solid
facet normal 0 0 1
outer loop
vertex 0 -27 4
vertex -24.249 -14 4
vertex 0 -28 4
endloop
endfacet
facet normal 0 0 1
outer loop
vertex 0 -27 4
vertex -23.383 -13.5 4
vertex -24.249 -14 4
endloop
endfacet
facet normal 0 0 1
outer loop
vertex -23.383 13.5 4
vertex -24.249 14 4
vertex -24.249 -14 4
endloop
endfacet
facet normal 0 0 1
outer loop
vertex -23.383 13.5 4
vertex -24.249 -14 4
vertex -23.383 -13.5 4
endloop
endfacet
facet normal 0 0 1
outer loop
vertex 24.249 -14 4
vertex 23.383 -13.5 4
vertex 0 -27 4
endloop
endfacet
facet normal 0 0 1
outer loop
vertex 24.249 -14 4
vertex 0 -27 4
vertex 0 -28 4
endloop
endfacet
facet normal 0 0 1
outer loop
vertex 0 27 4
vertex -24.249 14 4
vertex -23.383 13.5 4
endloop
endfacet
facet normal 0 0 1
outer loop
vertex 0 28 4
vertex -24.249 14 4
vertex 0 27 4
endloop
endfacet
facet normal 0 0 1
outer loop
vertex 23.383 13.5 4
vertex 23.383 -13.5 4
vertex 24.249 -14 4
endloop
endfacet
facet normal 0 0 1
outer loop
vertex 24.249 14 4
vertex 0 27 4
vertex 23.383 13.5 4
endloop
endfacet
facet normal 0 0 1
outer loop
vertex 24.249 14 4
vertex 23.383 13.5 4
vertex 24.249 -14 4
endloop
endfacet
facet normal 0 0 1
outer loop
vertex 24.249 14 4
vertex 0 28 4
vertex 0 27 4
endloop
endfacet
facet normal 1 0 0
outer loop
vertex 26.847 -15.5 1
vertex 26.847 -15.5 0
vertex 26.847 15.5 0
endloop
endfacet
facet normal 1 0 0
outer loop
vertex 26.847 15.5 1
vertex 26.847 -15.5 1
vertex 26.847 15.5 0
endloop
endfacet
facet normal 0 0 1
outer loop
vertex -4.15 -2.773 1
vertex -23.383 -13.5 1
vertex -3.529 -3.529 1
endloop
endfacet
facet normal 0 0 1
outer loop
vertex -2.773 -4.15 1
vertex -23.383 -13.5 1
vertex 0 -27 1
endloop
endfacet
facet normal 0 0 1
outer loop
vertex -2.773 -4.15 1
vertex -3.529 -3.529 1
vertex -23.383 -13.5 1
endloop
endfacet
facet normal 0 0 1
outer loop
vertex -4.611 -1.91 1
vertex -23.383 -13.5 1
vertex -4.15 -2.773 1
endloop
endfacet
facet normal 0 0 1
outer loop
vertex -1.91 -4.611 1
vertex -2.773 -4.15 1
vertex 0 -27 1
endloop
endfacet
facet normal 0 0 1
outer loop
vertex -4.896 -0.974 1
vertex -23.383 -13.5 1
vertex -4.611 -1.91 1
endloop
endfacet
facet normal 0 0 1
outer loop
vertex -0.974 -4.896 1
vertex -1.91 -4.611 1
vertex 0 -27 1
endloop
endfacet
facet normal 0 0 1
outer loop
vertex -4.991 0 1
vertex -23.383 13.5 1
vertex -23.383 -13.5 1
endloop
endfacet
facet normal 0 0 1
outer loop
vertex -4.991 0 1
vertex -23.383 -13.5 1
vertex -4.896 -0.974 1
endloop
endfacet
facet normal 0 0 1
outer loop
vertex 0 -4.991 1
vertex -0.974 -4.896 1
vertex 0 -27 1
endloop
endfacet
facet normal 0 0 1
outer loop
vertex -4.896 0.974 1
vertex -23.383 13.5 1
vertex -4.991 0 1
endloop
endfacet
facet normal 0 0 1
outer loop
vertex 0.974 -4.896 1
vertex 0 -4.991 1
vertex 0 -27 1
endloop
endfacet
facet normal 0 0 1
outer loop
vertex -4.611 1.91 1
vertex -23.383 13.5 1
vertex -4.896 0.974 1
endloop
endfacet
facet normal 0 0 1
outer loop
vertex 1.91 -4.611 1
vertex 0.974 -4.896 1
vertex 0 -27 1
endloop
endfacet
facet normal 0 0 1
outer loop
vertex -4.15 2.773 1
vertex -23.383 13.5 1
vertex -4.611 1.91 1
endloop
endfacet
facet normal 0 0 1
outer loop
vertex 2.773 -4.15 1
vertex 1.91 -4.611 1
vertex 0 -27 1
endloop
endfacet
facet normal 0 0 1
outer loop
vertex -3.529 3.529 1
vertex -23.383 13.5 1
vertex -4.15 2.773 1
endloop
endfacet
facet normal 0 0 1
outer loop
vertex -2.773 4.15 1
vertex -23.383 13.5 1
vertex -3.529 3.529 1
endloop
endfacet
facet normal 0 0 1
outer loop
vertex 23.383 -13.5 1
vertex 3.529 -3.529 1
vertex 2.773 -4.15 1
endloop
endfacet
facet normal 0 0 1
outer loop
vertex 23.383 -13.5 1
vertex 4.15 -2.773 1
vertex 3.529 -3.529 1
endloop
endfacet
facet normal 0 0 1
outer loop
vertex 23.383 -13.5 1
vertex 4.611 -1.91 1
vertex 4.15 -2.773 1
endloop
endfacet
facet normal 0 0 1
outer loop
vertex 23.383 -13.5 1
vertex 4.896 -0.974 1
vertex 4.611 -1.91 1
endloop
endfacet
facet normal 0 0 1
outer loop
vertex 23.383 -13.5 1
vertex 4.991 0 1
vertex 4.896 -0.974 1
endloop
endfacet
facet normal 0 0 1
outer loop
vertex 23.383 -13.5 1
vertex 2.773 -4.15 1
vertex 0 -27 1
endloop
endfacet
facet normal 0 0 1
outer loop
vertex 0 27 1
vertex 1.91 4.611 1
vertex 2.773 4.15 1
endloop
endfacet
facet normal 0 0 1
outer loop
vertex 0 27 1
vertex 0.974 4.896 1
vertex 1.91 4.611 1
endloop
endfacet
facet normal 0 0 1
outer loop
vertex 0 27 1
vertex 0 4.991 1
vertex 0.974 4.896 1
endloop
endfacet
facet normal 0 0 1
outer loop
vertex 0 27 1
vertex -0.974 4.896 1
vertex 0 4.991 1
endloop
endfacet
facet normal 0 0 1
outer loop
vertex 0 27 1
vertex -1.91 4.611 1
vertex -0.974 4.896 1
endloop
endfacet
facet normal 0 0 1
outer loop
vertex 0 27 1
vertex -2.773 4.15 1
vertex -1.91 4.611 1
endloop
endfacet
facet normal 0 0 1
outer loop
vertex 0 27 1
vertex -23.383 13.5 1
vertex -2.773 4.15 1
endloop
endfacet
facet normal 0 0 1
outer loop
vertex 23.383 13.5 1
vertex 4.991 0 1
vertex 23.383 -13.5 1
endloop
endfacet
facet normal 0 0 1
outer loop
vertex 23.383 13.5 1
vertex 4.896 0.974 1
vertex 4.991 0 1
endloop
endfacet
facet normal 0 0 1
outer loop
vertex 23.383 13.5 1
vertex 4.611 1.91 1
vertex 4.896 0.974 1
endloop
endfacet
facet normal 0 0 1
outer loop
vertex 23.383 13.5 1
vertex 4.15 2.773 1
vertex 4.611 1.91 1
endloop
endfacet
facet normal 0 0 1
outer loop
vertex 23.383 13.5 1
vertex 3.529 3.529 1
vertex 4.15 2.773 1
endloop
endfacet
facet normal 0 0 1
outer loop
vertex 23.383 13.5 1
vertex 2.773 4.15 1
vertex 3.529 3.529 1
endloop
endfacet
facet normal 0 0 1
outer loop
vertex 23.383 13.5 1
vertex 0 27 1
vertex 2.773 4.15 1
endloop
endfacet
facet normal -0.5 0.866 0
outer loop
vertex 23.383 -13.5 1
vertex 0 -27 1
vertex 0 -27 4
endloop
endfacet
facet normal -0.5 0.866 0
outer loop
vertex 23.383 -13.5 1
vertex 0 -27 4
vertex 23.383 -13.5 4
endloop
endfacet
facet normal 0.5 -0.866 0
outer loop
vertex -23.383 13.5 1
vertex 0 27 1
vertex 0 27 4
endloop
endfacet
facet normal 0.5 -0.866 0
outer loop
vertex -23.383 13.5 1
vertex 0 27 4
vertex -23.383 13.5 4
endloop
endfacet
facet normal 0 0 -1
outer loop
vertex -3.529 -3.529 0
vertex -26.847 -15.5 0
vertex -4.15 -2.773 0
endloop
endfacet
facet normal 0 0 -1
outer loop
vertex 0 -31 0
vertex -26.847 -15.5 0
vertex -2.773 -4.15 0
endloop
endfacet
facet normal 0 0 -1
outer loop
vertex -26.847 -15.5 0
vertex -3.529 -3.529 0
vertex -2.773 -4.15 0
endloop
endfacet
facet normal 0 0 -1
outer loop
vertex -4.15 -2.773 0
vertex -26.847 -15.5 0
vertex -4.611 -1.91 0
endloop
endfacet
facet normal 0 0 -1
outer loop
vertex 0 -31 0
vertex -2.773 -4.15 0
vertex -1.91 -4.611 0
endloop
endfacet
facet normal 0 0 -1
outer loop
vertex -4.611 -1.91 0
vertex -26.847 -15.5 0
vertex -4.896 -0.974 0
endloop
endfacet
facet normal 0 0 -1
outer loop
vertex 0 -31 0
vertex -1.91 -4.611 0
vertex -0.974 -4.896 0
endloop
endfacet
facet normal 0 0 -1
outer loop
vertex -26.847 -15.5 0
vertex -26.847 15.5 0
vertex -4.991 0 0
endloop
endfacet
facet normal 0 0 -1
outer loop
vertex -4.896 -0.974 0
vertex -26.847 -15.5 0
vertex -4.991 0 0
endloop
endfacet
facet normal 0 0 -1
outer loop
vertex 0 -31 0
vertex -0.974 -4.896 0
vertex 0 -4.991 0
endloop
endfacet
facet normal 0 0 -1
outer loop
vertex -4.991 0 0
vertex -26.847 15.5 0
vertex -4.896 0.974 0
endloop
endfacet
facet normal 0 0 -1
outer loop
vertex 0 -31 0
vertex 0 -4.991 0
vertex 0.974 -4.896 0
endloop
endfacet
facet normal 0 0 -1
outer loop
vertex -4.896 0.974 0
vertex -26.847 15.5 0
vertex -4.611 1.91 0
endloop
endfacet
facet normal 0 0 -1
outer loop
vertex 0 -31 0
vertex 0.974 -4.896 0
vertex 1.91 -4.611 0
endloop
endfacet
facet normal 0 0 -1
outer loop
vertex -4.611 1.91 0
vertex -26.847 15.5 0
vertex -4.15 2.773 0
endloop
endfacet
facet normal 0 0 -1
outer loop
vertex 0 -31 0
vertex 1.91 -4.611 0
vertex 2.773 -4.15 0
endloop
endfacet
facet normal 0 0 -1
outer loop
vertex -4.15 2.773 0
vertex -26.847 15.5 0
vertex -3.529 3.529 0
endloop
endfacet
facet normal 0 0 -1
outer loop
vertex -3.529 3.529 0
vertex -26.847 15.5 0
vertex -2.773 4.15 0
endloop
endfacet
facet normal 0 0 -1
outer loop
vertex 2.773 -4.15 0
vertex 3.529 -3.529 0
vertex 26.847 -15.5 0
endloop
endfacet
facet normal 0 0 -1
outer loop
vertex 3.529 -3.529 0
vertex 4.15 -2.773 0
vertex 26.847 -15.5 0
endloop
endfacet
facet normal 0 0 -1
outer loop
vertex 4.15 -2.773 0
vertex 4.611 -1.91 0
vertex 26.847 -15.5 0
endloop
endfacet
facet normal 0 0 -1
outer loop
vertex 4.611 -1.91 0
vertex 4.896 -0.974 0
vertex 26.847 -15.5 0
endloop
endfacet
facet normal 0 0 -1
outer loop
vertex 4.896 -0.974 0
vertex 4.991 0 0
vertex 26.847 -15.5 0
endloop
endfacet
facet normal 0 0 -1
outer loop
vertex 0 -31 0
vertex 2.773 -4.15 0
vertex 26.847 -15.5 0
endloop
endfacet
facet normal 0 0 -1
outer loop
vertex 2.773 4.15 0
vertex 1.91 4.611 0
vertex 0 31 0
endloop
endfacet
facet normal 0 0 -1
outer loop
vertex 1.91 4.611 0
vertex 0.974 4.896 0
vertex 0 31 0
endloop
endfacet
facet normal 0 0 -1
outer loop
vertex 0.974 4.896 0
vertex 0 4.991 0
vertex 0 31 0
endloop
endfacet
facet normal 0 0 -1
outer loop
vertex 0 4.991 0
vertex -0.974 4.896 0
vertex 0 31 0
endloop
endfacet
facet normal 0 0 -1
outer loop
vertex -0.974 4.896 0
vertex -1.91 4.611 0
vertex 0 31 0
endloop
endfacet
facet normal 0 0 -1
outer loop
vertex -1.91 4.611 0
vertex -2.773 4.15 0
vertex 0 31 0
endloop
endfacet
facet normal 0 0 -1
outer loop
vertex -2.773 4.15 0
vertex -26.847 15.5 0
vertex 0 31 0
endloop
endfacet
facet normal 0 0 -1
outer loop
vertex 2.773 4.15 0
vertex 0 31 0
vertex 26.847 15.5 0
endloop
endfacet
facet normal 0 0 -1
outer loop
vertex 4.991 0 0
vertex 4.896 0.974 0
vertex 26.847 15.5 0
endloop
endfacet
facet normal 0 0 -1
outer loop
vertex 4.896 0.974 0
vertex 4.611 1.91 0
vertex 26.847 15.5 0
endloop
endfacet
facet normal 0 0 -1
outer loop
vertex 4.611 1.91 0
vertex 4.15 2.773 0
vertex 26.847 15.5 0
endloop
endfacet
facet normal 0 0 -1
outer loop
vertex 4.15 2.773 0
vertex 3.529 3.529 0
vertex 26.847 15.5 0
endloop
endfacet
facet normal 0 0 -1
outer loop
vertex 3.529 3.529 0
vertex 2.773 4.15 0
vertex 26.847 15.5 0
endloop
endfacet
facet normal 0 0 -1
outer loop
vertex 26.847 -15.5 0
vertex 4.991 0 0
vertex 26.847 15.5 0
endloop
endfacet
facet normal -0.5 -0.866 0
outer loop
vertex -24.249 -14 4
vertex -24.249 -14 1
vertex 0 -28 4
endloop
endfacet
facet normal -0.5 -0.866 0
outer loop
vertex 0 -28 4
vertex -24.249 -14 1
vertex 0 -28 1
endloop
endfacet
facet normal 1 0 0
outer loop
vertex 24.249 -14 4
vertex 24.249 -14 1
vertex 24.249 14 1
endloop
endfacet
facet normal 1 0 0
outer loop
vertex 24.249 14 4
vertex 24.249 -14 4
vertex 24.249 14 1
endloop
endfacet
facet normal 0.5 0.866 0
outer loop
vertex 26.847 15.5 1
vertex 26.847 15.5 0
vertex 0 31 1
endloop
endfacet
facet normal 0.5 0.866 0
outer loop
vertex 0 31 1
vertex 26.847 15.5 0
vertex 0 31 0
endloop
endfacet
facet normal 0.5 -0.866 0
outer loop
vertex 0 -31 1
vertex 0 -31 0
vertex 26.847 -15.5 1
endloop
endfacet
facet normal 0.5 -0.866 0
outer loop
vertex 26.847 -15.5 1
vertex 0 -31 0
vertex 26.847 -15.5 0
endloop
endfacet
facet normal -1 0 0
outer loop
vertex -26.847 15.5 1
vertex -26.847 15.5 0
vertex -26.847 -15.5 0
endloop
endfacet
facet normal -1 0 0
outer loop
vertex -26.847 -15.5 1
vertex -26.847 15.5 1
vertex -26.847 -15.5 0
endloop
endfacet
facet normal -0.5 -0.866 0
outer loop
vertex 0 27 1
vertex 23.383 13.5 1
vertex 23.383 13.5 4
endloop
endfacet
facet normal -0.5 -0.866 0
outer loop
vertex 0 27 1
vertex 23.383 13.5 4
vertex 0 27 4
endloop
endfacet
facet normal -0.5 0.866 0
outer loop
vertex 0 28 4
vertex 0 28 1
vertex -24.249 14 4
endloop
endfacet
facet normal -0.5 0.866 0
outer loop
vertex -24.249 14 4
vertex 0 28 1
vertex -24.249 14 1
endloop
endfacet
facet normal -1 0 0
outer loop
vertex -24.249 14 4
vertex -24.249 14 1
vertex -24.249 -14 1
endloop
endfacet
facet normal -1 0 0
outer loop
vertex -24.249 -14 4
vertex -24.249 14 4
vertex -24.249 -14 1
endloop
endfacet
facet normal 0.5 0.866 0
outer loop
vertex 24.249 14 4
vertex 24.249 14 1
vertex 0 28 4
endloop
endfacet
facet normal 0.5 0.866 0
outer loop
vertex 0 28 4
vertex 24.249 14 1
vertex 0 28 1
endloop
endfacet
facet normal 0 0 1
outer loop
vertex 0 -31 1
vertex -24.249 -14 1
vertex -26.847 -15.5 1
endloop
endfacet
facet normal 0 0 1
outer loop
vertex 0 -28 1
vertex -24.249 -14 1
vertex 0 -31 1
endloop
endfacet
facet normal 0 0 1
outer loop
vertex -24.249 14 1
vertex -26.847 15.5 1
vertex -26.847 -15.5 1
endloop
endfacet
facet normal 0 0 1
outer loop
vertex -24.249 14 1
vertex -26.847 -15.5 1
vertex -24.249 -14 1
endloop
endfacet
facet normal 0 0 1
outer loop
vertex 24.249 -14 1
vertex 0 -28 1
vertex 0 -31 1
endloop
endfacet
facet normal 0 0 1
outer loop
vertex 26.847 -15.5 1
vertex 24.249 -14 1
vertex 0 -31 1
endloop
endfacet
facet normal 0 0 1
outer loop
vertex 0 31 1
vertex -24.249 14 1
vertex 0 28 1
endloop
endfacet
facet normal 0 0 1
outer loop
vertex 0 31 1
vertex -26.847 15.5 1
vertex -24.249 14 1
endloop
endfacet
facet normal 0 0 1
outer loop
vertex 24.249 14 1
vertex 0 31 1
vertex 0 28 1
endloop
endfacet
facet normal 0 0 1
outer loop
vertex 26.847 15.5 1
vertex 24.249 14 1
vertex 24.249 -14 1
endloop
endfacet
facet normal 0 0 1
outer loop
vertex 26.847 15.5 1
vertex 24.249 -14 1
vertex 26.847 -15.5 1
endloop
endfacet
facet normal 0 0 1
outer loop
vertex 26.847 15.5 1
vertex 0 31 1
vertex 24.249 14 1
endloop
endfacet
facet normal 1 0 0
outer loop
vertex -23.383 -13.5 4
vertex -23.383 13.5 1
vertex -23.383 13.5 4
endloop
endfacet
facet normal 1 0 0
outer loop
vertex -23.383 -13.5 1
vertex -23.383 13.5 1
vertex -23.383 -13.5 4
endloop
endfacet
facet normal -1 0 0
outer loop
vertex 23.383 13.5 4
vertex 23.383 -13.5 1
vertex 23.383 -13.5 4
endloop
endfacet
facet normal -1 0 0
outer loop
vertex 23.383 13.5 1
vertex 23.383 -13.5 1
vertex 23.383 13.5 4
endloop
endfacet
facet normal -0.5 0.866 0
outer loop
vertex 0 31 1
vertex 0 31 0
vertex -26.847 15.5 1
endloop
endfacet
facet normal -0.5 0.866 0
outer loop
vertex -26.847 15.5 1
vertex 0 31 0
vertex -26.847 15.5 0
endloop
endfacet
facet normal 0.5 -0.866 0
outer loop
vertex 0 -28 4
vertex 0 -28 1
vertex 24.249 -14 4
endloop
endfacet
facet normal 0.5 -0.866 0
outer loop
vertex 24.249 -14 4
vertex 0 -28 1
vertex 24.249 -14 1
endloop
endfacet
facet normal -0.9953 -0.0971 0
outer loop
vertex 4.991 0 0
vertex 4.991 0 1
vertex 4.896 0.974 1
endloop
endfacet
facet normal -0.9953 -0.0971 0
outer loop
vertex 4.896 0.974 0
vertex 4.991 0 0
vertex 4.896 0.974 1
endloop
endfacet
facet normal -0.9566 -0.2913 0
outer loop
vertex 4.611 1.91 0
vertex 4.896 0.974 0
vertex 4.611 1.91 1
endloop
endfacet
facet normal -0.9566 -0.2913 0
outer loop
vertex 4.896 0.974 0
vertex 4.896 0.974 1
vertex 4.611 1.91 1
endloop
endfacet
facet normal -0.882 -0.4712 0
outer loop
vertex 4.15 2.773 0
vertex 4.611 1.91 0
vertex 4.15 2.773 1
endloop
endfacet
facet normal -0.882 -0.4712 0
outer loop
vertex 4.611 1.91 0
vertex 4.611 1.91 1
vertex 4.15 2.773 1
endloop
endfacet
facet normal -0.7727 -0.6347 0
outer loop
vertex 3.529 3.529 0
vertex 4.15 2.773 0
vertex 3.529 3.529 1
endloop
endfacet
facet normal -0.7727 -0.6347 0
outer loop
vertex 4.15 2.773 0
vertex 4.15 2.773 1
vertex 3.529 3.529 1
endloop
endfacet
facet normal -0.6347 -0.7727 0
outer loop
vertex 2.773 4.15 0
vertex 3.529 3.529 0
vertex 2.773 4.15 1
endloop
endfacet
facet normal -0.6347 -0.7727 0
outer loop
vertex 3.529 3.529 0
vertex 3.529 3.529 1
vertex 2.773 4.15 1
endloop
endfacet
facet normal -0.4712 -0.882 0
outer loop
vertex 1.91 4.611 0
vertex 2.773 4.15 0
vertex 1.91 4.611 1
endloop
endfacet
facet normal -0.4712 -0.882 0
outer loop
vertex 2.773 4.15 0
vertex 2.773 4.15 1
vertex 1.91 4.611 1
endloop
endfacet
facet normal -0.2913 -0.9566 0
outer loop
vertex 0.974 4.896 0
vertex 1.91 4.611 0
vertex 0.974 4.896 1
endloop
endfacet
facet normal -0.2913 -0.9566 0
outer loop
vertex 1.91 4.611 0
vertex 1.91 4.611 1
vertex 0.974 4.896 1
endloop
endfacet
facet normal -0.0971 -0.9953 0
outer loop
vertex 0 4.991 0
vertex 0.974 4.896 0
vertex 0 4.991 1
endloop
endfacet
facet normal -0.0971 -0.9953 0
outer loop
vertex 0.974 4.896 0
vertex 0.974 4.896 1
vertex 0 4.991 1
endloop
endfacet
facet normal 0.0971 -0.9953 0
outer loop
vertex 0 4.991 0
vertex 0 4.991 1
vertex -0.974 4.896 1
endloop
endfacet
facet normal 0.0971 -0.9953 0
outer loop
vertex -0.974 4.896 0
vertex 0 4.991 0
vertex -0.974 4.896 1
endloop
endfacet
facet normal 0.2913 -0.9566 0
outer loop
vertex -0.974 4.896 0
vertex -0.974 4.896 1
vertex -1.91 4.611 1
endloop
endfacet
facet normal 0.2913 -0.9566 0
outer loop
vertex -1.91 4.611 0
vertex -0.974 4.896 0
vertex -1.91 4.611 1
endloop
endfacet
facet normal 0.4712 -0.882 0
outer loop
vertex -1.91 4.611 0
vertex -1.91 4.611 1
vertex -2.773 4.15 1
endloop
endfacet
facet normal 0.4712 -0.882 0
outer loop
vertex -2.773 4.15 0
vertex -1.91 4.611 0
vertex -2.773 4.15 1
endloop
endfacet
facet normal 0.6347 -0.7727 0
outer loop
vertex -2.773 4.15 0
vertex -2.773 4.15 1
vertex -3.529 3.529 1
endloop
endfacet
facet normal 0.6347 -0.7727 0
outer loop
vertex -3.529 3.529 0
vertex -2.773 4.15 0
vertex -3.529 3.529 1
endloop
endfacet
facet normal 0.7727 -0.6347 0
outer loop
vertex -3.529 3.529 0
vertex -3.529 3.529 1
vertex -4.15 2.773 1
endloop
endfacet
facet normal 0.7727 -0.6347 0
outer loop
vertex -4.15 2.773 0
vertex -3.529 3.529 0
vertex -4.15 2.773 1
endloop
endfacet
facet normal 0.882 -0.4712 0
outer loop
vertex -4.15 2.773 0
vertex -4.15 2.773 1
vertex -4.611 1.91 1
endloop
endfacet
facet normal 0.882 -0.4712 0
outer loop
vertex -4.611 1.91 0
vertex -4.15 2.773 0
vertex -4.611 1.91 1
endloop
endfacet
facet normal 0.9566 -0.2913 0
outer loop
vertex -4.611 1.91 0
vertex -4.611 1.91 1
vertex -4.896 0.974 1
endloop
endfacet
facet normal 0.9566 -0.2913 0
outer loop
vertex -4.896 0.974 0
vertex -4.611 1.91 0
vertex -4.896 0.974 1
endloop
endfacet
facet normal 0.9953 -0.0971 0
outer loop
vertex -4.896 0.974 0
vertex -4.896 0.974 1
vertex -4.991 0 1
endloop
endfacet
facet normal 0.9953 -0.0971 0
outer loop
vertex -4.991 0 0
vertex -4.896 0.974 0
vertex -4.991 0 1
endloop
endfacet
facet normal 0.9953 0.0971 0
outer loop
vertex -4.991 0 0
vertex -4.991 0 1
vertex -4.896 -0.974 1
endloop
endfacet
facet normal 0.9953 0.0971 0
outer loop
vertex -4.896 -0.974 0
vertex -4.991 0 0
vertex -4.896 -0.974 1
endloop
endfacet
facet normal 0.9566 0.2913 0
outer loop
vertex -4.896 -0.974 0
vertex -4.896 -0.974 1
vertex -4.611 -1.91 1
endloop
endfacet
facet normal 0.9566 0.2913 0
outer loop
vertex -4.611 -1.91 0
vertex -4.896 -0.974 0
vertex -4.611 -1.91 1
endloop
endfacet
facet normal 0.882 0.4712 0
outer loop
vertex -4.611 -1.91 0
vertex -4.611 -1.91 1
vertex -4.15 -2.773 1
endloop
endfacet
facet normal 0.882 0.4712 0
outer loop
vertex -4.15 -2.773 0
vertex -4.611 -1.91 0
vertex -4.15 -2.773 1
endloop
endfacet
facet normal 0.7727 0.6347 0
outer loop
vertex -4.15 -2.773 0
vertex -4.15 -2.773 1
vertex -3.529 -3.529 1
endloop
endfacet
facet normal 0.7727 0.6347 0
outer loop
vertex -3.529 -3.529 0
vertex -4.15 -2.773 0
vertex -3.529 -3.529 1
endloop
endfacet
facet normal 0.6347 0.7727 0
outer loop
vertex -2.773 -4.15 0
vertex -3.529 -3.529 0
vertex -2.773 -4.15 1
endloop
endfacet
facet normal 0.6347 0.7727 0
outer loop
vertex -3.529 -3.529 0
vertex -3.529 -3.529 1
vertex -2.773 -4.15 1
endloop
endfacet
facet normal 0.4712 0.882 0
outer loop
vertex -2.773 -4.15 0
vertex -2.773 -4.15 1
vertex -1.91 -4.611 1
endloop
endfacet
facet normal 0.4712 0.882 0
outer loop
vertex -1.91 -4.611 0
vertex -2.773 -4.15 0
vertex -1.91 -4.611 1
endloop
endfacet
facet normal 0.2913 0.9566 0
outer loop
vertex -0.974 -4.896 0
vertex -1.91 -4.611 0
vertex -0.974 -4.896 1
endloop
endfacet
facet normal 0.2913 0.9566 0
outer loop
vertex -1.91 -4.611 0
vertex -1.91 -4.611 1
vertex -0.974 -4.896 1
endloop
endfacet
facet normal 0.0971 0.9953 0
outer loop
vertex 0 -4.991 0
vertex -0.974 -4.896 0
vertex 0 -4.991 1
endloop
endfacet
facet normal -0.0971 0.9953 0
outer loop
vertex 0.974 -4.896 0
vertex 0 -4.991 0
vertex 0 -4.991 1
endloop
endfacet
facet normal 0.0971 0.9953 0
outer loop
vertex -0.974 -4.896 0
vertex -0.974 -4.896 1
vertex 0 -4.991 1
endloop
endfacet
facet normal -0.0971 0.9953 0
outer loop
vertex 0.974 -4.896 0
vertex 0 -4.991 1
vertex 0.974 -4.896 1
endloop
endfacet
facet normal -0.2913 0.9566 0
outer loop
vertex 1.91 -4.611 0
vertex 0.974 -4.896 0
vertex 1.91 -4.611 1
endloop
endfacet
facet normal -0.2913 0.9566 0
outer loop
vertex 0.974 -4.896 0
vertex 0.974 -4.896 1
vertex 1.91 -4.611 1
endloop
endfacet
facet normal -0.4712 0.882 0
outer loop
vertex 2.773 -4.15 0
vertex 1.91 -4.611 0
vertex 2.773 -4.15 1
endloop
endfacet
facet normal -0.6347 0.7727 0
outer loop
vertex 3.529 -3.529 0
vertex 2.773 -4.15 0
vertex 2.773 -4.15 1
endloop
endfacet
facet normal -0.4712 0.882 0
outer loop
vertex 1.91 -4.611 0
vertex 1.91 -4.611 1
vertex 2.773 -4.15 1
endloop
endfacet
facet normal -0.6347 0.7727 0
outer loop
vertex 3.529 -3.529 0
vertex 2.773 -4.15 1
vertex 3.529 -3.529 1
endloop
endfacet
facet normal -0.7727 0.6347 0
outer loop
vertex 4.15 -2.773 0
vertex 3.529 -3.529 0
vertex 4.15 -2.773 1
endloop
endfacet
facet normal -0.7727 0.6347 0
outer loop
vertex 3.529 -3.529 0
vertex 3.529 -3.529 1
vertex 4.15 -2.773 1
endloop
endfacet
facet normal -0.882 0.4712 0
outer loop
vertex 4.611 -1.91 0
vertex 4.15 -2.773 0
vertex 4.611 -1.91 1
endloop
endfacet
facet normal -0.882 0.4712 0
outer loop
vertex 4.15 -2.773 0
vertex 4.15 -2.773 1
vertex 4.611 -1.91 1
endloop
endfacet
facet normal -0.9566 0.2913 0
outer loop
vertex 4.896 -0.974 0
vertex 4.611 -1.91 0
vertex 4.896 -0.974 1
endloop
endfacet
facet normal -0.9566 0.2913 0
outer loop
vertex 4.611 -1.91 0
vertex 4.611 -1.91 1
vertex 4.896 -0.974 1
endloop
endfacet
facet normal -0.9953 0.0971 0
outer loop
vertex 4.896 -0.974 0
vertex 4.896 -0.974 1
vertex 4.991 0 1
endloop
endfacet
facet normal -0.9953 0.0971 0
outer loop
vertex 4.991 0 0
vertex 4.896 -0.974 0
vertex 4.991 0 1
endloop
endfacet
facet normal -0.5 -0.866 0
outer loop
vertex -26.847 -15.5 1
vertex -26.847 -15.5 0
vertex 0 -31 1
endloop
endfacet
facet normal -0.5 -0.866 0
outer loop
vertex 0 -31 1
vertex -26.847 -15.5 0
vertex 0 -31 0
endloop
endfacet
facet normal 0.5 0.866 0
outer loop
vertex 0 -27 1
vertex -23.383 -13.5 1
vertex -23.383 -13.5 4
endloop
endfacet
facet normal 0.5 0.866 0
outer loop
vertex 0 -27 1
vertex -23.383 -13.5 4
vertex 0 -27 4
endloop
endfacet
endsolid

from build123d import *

# Parameters (mm, degrees)
PAD_DEPTH    = 1
PAD001_DEPTH = 3
SKETCH002_R  = 4.991419
POCKET_DEPTH = 5


with BuildPart() as part:
    # Sketch → Pad (new body)
    with BuildSketch(Plane.XY):
        Polygon((0, -31), (26.846788, -15.5), (26.846788, 15.5), (0, 31), (-26.846788, 15.5), (-26.846788, -15.5), align=None)
    extrude(amount=PAD_DEPTH)

    # Sketch001 (on Face8 of Pad) → Pad001 (join)
    with BuildSketch(Plane.XY.offset(1)):
        Polygon((0, -28), (24.248711, -14), (24.248711, 14), (0, 28), (-24.248711, 14), (-24.248711, -14), align=None)
        Polygon((0, -27), (23.382686, -13.5), (23.382686, 13.5), (0, 27), (-23.382686, 13.5), (-23.382686, -13.5), align=None, mode=Mode.SUBTRACT)
    extrude(amount=PAD001_DEPTH)

    # Sketch002 (on Face22 of Pad001) → Pocket (cut)
    with BuildSketch(Plane.XY.offset(1)):
        Circle(SKETCH002_R)
    extrude(amount=-POCKET_DEPTH, mode=Mode.SUBTRACT)


solid = part.part
